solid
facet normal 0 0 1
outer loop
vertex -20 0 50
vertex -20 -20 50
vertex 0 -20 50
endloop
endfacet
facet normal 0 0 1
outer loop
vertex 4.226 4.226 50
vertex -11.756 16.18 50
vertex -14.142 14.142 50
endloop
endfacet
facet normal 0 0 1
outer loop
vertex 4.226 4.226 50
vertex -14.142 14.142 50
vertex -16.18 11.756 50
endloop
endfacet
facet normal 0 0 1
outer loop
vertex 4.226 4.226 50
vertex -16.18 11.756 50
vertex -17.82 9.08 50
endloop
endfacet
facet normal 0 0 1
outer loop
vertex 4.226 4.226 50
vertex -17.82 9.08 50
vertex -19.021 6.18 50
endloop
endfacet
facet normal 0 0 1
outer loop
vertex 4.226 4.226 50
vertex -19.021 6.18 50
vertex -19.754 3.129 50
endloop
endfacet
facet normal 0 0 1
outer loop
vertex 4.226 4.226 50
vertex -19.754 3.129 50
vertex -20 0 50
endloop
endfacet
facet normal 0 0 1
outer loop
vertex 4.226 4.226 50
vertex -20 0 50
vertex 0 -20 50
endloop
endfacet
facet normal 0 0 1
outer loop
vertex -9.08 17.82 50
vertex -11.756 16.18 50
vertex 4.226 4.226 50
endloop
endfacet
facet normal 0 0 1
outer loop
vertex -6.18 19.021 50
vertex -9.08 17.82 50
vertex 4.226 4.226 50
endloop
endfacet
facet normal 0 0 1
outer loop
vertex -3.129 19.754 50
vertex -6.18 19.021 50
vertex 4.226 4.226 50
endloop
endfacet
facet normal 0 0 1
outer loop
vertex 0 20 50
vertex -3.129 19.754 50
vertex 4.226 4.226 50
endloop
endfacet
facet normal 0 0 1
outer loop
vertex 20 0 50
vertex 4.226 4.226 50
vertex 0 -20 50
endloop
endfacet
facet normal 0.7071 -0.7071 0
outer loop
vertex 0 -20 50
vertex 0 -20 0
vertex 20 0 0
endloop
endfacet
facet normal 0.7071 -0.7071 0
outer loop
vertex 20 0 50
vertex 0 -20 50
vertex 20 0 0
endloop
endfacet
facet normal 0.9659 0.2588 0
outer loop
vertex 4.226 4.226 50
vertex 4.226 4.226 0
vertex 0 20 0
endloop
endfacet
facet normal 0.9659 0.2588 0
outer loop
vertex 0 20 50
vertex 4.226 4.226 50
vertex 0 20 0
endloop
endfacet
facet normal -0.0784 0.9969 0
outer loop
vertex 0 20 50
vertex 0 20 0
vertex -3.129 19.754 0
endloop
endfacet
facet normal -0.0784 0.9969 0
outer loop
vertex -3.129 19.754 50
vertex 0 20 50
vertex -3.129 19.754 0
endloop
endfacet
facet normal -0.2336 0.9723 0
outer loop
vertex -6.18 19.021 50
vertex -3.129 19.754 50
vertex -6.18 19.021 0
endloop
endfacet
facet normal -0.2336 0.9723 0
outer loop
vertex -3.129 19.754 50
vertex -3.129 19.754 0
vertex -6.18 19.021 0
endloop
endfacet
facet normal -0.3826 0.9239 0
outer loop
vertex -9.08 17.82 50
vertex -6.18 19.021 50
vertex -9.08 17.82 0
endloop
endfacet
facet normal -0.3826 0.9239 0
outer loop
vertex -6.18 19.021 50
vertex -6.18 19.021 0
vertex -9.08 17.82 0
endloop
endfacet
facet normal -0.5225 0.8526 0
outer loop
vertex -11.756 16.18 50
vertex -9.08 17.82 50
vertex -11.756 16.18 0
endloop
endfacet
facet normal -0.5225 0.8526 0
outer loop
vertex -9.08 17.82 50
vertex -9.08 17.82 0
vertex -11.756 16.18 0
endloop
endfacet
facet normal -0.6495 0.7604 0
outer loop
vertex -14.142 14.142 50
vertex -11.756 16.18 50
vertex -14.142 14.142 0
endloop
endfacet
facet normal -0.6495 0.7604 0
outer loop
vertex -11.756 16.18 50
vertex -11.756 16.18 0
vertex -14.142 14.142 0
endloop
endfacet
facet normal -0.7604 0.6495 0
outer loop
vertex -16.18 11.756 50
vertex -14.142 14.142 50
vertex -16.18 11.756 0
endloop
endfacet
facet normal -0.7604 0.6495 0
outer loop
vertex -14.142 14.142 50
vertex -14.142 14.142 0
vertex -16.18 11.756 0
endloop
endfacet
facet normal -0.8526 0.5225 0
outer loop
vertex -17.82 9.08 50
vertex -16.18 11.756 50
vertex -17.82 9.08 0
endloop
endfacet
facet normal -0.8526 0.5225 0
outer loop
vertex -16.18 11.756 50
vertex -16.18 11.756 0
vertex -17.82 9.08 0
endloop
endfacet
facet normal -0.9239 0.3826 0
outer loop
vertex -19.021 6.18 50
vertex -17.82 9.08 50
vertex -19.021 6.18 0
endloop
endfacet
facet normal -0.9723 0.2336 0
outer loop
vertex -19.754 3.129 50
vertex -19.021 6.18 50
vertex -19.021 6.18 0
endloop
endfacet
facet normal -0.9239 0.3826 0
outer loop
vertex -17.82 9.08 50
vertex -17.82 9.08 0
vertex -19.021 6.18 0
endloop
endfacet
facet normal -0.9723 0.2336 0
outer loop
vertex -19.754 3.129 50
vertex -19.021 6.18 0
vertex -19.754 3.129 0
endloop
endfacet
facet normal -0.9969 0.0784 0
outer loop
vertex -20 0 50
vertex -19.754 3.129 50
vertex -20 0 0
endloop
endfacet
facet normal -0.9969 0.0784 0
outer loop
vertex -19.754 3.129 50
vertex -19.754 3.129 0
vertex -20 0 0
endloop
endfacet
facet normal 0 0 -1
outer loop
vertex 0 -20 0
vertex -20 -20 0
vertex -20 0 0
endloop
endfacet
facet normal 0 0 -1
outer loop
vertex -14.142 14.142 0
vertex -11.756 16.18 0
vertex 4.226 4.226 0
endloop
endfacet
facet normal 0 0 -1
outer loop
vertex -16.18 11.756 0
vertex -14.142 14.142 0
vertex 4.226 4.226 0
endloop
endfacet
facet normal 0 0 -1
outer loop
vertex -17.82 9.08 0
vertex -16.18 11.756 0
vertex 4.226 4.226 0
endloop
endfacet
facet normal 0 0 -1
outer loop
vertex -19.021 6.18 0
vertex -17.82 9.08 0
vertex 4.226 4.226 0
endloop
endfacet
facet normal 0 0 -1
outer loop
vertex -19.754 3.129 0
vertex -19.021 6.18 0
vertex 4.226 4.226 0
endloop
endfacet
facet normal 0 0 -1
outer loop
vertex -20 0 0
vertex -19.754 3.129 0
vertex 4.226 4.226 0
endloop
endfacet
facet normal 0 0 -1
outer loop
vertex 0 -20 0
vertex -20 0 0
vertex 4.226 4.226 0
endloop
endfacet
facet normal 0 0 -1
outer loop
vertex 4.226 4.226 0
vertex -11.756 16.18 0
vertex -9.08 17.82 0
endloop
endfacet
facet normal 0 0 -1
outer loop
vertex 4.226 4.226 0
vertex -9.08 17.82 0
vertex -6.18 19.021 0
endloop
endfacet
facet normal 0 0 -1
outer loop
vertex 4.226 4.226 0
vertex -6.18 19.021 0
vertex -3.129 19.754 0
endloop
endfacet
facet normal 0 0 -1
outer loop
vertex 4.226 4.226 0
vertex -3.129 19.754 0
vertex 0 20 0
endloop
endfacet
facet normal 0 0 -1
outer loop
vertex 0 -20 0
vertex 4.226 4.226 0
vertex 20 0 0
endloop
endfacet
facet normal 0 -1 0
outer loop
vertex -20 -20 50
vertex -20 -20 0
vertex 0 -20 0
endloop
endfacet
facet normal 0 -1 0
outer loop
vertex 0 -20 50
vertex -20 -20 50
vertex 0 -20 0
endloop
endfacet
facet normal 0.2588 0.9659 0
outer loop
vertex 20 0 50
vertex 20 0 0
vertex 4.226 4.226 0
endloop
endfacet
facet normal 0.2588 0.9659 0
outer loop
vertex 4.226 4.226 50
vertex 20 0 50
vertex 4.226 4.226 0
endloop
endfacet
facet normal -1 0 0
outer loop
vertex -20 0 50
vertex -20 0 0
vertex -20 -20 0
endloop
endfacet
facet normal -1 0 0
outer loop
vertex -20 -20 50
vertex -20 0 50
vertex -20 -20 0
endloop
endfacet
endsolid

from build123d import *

# Parameters (mm, degrees)
F1_DEPTH = 50


with BuildPart() as f1:
    # F0 (on Top) → F1 (new body)
    with BuildSketch(Plane.XY):
        with BuildLine():
            ThreePointArc((0, 20), (-14.142136, 14.142136), (-20, 0))
            Line((-20, 0), (-20, -20))
            Line((-20, -20), (0, -20))
            Line((0, -20), (20, 0))
            Line((20, 0), (4.226497, 4.226497))
            Line((4.226497, 4.226497), (0, 20))
        make_face()
    extrude(amount=F1_DEPTH)


solid = f1.part
